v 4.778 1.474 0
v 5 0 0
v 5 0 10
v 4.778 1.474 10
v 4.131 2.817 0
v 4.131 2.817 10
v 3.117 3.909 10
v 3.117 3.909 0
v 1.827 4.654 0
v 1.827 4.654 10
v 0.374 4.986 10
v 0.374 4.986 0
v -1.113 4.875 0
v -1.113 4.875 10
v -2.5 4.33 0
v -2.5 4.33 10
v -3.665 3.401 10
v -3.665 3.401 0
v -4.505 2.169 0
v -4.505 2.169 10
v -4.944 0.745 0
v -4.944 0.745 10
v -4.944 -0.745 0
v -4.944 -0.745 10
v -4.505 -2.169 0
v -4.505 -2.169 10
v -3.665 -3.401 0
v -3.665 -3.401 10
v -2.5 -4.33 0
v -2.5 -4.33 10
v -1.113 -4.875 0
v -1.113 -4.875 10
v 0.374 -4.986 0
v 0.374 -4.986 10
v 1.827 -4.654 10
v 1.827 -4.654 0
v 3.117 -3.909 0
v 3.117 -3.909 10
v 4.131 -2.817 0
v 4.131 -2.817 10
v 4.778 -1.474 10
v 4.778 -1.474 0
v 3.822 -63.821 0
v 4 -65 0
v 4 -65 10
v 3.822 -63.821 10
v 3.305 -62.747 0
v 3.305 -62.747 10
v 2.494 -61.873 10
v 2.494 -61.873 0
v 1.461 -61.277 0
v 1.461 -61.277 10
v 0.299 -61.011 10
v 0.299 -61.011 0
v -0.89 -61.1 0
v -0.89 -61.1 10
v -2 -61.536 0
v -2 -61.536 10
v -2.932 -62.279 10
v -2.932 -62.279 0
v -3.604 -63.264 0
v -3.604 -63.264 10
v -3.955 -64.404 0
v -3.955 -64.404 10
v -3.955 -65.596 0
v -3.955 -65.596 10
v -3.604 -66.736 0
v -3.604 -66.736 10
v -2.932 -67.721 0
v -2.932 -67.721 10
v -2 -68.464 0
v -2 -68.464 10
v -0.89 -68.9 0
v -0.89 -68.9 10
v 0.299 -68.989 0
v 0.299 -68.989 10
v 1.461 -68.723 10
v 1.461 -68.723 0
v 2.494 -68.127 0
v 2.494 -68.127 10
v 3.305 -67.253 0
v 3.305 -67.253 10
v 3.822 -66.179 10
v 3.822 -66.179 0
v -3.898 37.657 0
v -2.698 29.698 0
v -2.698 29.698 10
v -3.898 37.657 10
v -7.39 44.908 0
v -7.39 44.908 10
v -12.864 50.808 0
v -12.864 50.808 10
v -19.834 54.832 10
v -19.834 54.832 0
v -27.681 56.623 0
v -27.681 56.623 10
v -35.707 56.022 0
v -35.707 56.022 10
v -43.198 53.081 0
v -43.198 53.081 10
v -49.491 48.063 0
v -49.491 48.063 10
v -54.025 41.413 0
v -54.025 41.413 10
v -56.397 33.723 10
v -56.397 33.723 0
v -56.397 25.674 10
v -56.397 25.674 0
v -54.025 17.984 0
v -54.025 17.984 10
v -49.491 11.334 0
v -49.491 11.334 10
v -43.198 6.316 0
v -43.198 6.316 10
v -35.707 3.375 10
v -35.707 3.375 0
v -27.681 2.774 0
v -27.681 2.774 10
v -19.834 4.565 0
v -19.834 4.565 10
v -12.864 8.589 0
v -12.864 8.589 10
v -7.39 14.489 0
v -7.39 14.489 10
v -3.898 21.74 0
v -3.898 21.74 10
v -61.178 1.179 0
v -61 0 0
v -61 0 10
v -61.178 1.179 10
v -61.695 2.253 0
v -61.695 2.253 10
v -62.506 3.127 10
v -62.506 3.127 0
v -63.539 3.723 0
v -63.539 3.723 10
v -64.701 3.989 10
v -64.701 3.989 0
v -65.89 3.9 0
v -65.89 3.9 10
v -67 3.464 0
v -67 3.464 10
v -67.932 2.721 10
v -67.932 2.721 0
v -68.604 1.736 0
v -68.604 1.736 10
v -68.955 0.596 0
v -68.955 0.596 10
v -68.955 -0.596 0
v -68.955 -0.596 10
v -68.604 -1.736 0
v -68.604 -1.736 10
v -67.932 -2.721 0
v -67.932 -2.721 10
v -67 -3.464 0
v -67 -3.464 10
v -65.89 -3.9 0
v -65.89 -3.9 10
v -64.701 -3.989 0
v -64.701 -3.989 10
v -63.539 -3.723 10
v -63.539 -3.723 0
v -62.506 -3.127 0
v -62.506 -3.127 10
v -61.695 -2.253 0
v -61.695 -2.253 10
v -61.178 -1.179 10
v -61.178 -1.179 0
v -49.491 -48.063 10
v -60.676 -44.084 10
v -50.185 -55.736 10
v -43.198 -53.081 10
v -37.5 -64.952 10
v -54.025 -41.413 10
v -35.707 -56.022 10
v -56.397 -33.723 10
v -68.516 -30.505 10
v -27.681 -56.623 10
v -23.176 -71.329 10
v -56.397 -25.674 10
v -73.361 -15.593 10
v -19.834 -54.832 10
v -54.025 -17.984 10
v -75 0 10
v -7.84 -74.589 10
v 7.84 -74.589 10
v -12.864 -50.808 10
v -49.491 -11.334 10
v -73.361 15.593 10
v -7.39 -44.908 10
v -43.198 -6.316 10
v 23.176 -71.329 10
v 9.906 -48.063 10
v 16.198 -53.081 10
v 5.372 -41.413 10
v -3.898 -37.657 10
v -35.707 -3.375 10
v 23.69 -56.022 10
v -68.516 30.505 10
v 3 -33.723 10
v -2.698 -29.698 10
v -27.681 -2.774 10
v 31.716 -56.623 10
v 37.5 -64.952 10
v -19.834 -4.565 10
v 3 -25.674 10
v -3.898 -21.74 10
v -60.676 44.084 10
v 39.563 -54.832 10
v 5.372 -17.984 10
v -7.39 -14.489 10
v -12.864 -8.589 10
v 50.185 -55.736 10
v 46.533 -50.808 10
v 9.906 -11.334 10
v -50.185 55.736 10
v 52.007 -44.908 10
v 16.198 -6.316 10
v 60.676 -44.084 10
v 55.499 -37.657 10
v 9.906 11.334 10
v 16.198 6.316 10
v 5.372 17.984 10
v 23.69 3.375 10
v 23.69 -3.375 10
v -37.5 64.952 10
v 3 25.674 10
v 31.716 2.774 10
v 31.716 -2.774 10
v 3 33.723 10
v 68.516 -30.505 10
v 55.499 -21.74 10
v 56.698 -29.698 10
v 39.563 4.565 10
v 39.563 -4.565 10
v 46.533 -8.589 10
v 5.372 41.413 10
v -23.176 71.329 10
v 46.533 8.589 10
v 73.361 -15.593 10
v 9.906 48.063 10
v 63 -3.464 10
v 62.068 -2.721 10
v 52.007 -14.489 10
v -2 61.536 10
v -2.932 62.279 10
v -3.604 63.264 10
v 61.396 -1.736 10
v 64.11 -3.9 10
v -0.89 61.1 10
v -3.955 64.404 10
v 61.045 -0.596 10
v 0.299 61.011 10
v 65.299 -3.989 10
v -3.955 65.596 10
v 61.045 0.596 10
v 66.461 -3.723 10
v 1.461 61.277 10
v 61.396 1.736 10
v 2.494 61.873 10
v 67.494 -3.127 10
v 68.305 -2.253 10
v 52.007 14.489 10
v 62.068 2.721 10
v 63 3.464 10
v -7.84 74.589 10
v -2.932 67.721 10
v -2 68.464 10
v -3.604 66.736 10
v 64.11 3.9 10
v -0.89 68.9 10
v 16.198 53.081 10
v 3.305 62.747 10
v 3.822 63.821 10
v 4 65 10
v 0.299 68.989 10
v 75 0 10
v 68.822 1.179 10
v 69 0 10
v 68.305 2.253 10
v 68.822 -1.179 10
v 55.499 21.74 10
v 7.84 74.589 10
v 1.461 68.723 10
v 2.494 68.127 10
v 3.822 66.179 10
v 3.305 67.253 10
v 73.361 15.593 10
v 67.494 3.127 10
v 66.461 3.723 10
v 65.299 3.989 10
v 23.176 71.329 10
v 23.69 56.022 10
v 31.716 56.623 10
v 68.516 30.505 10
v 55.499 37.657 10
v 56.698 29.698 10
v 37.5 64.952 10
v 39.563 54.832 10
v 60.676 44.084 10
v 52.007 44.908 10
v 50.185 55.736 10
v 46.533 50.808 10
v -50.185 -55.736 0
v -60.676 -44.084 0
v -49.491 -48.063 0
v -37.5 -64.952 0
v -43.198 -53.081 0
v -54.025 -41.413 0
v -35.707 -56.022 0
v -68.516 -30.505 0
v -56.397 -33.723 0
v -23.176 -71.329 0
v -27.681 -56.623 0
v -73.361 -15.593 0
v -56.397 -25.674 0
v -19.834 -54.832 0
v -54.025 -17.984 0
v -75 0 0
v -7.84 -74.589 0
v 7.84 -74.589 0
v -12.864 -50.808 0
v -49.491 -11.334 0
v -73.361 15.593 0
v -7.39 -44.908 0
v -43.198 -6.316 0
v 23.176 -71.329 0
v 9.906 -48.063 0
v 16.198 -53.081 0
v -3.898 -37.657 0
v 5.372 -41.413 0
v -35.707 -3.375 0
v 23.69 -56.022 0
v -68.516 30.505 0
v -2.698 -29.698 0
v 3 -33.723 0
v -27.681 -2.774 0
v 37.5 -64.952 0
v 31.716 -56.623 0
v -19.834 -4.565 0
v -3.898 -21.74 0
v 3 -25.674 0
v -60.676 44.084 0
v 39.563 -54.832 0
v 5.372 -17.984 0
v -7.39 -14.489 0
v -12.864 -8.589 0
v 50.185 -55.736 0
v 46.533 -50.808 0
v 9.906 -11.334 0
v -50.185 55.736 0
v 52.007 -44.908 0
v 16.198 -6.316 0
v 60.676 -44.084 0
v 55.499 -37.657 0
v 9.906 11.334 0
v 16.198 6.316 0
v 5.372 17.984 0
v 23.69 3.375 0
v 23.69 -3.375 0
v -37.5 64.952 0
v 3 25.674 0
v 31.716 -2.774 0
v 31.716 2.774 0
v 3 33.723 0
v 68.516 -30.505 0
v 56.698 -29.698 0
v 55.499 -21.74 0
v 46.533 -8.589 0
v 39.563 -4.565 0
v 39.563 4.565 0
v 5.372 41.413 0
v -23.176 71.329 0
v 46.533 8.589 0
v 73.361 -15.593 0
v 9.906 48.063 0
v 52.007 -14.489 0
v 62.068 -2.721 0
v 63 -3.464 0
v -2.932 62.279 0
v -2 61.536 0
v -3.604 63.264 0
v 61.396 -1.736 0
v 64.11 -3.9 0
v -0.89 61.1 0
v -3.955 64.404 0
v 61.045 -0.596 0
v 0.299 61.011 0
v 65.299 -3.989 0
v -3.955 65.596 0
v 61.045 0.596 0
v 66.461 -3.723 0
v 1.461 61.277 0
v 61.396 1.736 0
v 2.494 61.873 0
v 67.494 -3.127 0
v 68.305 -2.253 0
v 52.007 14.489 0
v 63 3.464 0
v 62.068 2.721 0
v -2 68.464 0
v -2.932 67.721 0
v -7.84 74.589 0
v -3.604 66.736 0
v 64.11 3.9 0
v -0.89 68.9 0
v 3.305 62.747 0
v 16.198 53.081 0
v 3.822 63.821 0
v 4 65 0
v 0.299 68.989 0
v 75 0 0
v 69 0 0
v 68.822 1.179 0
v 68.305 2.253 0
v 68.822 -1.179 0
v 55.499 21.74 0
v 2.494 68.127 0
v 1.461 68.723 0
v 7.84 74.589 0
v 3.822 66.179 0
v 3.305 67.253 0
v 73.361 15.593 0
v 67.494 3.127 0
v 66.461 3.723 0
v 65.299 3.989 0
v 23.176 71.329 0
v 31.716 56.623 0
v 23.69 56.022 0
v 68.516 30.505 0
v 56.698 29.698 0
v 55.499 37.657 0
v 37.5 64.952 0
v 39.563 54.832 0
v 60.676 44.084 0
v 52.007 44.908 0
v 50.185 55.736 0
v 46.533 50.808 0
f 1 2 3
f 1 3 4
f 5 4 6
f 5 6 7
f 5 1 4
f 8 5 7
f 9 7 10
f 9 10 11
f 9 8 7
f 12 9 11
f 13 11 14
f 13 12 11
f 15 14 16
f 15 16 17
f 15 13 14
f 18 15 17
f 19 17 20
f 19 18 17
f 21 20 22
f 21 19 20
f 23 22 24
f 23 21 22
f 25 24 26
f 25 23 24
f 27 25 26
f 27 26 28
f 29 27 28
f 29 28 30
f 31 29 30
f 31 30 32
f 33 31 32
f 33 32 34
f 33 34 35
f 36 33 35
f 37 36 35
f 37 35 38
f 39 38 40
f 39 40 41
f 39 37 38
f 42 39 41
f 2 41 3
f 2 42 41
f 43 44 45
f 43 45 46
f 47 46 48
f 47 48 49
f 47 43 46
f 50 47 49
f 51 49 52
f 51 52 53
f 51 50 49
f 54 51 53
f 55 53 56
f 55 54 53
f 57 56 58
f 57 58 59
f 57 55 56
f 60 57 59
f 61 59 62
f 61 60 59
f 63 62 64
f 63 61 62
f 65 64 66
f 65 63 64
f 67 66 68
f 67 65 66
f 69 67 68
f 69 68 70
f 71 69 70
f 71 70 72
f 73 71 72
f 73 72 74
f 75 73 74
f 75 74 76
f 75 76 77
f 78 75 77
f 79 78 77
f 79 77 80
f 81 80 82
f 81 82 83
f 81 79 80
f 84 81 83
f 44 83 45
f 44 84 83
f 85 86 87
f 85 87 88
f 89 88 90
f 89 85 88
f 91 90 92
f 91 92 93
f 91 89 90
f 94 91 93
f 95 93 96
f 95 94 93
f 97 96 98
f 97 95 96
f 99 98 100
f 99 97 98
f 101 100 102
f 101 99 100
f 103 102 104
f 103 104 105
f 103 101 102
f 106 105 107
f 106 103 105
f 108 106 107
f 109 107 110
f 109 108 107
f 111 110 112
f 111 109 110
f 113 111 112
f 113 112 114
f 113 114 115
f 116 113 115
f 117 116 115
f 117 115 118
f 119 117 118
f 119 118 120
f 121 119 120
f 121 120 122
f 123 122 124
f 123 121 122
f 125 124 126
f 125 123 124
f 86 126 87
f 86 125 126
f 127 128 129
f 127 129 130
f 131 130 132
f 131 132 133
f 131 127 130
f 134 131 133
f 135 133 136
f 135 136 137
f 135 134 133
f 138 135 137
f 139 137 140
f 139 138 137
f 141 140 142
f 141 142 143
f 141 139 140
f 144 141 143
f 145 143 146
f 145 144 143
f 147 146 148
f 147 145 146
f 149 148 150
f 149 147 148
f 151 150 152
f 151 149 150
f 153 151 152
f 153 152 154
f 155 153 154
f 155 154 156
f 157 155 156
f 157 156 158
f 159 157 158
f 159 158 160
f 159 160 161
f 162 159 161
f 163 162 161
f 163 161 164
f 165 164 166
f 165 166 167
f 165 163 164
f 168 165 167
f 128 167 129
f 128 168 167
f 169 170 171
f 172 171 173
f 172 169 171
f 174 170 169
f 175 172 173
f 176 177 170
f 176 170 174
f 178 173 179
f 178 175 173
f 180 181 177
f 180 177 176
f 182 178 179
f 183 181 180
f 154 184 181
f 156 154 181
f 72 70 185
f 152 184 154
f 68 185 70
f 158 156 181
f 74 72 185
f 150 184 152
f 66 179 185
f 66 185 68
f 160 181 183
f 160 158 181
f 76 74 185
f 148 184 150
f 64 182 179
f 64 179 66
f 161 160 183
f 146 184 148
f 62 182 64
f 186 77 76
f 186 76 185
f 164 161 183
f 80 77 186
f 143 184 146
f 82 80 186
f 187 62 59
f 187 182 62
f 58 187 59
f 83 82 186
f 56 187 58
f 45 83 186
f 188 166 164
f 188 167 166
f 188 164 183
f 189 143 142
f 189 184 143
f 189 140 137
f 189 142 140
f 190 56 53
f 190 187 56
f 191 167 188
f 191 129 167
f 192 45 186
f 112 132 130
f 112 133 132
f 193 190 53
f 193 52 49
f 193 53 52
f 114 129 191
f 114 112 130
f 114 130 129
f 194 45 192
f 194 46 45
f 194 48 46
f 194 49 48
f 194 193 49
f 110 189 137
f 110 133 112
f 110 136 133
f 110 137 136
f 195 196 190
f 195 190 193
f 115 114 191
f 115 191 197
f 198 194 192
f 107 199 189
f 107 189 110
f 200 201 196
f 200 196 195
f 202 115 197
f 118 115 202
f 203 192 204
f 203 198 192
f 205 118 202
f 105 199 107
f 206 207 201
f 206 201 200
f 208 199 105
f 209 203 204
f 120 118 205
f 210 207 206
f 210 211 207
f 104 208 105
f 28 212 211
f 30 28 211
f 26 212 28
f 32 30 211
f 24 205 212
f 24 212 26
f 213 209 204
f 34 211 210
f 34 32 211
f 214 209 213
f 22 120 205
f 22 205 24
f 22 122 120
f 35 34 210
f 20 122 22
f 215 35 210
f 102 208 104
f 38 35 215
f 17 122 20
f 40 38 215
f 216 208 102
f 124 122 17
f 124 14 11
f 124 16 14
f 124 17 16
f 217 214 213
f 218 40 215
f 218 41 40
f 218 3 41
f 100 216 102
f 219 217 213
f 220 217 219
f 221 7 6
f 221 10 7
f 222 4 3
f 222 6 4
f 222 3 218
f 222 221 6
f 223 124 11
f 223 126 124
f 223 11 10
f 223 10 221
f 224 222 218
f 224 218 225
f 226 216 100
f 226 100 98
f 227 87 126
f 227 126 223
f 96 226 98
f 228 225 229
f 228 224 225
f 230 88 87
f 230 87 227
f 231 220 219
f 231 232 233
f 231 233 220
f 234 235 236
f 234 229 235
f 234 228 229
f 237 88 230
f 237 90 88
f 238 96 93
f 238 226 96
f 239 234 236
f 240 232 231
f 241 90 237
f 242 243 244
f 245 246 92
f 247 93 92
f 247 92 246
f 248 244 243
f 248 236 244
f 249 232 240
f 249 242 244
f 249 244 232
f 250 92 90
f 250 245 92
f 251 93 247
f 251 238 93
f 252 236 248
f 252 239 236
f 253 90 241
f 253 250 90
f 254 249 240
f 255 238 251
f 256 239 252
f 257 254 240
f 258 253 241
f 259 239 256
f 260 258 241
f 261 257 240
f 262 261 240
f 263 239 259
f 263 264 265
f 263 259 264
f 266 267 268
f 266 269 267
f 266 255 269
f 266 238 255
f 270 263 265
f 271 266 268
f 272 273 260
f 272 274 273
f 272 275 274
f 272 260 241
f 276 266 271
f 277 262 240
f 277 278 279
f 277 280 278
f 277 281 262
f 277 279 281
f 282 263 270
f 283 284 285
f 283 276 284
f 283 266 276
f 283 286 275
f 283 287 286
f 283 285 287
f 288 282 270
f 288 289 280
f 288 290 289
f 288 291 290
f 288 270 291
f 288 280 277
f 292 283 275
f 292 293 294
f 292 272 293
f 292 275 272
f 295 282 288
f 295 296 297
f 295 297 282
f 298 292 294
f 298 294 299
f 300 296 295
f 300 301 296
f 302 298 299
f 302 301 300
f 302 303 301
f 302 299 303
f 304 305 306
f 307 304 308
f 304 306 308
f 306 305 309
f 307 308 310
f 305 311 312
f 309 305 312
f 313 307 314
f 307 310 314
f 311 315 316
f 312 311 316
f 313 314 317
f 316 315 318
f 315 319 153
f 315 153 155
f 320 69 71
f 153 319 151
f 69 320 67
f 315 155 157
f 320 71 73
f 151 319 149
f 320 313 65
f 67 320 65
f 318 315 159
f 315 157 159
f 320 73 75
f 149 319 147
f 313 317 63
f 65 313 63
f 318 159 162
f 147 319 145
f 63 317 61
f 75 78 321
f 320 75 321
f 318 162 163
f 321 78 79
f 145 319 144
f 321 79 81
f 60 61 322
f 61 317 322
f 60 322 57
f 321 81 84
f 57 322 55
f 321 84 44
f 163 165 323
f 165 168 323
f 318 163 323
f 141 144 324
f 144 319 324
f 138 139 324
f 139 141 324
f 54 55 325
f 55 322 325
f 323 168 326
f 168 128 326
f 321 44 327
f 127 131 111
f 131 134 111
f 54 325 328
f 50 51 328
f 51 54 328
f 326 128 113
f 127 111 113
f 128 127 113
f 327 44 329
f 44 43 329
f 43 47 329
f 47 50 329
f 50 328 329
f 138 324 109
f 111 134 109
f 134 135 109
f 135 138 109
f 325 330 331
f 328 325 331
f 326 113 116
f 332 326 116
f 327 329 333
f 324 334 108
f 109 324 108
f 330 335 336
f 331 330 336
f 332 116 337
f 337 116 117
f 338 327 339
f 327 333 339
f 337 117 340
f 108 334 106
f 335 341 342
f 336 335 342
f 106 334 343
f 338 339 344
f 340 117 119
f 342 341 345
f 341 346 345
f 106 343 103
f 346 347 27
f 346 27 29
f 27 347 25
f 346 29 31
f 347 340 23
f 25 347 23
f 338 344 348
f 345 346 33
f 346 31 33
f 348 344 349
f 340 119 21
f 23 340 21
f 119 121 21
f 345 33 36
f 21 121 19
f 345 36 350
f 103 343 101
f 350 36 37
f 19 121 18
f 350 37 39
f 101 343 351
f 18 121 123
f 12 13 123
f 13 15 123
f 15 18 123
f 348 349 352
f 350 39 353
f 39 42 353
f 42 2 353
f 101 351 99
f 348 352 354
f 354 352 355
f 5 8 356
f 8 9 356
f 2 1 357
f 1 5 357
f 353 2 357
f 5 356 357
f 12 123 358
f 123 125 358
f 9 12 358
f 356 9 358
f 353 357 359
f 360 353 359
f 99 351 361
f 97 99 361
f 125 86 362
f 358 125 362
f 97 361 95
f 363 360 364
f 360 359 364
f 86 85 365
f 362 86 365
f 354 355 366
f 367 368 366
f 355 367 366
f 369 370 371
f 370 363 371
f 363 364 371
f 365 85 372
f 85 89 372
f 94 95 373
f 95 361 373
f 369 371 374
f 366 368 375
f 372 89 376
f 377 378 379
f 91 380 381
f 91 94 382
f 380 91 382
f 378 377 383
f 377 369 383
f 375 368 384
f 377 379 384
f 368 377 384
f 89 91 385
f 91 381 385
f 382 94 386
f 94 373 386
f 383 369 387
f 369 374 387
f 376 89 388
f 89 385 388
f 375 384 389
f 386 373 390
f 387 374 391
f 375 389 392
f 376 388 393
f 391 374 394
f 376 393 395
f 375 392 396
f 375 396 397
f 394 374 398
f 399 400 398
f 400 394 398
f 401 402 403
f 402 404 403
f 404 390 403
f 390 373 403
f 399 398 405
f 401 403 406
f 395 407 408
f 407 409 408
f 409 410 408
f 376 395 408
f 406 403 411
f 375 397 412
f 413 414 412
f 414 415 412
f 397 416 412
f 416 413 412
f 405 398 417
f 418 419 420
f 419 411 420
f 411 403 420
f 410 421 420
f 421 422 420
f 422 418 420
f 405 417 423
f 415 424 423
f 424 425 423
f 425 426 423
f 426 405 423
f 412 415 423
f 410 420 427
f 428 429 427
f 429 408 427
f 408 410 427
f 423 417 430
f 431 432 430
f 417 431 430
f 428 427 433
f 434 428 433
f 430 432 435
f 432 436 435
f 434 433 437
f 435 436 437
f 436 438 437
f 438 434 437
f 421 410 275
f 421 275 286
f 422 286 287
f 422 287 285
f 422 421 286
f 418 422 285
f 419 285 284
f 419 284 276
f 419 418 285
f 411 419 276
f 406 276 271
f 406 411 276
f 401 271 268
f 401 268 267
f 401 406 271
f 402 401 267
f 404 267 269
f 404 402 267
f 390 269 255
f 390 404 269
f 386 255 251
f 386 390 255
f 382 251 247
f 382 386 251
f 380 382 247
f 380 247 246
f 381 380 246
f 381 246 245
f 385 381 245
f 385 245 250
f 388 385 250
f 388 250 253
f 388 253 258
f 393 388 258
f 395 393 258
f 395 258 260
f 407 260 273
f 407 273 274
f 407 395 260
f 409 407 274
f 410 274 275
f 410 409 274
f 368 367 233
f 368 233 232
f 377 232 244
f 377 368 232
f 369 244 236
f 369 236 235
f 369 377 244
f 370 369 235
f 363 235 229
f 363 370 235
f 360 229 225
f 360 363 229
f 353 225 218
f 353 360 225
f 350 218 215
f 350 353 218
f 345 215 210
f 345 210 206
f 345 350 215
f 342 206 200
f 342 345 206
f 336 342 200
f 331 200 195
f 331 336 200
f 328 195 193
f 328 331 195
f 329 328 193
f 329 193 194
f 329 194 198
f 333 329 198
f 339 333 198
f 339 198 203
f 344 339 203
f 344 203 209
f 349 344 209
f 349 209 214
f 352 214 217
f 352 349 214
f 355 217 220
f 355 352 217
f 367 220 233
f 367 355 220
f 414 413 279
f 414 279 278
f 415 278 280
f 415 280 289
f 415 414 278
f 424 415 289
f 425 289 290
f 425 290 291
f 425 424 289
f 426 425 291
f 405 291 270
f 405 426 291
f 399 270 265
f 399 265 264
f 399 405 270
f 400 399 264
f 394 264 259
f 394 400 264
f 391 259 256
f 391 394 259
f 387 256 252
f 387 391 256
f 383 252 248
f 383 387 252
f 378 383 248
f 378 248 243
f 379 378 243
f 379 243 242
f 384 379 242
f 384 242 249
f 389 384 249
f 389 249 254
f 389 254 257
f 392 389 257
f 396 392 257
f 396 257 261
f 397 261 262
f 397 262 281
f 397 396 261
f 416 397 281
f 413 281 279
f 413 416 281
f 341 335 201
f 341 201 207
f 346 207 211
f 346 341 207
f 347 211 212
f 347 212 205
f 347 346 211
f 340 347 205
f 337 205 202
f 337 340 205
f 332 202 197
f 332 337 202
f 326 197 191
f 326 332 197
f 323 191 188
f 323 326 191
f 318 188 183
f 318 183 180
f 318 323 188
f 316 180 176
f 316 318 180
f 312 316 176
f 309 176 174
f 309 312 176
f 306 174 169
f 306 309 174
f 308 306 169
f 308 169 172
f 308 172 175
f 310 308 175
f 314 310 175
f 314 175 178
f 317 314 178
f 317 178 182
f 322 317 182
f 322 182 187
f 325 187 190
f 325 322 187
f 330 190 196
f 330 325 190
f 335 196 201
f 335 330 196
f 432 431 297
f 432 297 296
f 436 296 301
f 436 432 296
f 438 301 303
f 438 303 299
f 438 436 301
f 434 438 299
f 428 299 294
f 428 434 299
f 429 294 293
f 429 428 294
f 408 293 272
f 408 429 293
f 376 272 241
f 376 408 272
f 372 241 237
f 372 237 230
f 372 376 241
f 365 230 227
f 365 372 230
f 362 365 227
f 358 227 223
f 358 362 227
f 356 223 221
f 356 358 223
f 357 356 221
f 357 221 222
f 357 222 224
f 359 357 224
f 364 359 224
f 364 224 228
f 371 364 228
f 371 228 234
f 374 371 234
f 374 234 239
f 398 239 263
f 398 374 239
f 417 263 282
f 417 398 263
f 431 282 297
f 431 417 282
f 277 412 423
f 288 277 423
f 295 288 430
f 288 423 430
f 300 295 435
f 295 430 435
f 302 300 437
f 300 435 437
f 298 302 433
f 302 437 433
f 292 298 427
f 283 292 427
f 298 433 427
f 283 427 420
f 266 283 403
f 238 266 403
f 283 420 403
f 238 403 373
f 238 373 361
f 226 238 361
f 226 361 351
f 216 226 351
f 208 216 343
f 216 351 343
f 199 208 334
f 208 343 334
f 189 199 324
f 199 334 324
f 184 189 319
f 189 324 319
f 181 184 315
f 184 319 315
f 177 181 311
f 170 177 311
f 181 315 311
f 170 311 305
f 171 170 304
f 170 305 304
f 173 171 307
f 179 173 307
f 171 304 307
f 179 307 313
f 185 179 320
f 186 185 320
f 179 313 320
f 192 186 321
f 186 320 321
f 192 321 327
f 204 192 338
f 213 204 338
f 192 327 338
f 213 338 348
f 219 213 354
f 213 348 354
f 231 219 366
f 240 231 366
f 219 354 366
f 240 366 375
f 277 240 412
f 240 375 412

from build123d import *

# Parameters (mm, degrees)
SKETCH1_R           = 75
SKETCH1_R_2         = 27
SKETCH1_R_3         = 5
SKETCH1_R_4         = 4
BOSS_EXTRUDE1_DEPTH = 10


with BuildPart() as part:
    # Sketch1 → Boss-Extrude1 (new body)
    with BuildSketch(Plane.XY):
        Circle(SKETCH1_R)
        with Locations((-29.69848481, 29.69848481)):
            Circle(SKETCH1_R_2, mode=Mode.SUBTRACT)
        with Locations((29.69848481, 29.69848481)):
            Circle(SKETCH1_R_2, mode=Mode.SUBTRACT)
        with Locations((29.69848481, -29.69848481)):
            Circle(SKETCH1_R_2, mode=Mode.SUBTRACT)
        with Locations((-29.69848481, -29.69848481)):
            Circle(SKETCH1_R_2, mode=Mode.SUBTRACT)
        Circle(SKETCH1_R_3, mode=Mode.SUBTRACT)
        with Locations((0, 65)):
            Circle(SKETCH1_R_4, mode=Mode.SUBTRACT)
        with Locations((65, 0)):
            Circle(SKETCH1_R_4, mode=Mode.SUBTRACT)
        with Locations((0, -65)):
            Circle(SKETCH1_R_4, mode=Mode.SUBTRACT)
        with Locations((-65, 0)):
            Circle(SKETCH1_R_4, mode=Mode.SUBTRACT)
    extrude(amount=BOSS_EXTRUDE1_DEPTH)


solid = part.part
